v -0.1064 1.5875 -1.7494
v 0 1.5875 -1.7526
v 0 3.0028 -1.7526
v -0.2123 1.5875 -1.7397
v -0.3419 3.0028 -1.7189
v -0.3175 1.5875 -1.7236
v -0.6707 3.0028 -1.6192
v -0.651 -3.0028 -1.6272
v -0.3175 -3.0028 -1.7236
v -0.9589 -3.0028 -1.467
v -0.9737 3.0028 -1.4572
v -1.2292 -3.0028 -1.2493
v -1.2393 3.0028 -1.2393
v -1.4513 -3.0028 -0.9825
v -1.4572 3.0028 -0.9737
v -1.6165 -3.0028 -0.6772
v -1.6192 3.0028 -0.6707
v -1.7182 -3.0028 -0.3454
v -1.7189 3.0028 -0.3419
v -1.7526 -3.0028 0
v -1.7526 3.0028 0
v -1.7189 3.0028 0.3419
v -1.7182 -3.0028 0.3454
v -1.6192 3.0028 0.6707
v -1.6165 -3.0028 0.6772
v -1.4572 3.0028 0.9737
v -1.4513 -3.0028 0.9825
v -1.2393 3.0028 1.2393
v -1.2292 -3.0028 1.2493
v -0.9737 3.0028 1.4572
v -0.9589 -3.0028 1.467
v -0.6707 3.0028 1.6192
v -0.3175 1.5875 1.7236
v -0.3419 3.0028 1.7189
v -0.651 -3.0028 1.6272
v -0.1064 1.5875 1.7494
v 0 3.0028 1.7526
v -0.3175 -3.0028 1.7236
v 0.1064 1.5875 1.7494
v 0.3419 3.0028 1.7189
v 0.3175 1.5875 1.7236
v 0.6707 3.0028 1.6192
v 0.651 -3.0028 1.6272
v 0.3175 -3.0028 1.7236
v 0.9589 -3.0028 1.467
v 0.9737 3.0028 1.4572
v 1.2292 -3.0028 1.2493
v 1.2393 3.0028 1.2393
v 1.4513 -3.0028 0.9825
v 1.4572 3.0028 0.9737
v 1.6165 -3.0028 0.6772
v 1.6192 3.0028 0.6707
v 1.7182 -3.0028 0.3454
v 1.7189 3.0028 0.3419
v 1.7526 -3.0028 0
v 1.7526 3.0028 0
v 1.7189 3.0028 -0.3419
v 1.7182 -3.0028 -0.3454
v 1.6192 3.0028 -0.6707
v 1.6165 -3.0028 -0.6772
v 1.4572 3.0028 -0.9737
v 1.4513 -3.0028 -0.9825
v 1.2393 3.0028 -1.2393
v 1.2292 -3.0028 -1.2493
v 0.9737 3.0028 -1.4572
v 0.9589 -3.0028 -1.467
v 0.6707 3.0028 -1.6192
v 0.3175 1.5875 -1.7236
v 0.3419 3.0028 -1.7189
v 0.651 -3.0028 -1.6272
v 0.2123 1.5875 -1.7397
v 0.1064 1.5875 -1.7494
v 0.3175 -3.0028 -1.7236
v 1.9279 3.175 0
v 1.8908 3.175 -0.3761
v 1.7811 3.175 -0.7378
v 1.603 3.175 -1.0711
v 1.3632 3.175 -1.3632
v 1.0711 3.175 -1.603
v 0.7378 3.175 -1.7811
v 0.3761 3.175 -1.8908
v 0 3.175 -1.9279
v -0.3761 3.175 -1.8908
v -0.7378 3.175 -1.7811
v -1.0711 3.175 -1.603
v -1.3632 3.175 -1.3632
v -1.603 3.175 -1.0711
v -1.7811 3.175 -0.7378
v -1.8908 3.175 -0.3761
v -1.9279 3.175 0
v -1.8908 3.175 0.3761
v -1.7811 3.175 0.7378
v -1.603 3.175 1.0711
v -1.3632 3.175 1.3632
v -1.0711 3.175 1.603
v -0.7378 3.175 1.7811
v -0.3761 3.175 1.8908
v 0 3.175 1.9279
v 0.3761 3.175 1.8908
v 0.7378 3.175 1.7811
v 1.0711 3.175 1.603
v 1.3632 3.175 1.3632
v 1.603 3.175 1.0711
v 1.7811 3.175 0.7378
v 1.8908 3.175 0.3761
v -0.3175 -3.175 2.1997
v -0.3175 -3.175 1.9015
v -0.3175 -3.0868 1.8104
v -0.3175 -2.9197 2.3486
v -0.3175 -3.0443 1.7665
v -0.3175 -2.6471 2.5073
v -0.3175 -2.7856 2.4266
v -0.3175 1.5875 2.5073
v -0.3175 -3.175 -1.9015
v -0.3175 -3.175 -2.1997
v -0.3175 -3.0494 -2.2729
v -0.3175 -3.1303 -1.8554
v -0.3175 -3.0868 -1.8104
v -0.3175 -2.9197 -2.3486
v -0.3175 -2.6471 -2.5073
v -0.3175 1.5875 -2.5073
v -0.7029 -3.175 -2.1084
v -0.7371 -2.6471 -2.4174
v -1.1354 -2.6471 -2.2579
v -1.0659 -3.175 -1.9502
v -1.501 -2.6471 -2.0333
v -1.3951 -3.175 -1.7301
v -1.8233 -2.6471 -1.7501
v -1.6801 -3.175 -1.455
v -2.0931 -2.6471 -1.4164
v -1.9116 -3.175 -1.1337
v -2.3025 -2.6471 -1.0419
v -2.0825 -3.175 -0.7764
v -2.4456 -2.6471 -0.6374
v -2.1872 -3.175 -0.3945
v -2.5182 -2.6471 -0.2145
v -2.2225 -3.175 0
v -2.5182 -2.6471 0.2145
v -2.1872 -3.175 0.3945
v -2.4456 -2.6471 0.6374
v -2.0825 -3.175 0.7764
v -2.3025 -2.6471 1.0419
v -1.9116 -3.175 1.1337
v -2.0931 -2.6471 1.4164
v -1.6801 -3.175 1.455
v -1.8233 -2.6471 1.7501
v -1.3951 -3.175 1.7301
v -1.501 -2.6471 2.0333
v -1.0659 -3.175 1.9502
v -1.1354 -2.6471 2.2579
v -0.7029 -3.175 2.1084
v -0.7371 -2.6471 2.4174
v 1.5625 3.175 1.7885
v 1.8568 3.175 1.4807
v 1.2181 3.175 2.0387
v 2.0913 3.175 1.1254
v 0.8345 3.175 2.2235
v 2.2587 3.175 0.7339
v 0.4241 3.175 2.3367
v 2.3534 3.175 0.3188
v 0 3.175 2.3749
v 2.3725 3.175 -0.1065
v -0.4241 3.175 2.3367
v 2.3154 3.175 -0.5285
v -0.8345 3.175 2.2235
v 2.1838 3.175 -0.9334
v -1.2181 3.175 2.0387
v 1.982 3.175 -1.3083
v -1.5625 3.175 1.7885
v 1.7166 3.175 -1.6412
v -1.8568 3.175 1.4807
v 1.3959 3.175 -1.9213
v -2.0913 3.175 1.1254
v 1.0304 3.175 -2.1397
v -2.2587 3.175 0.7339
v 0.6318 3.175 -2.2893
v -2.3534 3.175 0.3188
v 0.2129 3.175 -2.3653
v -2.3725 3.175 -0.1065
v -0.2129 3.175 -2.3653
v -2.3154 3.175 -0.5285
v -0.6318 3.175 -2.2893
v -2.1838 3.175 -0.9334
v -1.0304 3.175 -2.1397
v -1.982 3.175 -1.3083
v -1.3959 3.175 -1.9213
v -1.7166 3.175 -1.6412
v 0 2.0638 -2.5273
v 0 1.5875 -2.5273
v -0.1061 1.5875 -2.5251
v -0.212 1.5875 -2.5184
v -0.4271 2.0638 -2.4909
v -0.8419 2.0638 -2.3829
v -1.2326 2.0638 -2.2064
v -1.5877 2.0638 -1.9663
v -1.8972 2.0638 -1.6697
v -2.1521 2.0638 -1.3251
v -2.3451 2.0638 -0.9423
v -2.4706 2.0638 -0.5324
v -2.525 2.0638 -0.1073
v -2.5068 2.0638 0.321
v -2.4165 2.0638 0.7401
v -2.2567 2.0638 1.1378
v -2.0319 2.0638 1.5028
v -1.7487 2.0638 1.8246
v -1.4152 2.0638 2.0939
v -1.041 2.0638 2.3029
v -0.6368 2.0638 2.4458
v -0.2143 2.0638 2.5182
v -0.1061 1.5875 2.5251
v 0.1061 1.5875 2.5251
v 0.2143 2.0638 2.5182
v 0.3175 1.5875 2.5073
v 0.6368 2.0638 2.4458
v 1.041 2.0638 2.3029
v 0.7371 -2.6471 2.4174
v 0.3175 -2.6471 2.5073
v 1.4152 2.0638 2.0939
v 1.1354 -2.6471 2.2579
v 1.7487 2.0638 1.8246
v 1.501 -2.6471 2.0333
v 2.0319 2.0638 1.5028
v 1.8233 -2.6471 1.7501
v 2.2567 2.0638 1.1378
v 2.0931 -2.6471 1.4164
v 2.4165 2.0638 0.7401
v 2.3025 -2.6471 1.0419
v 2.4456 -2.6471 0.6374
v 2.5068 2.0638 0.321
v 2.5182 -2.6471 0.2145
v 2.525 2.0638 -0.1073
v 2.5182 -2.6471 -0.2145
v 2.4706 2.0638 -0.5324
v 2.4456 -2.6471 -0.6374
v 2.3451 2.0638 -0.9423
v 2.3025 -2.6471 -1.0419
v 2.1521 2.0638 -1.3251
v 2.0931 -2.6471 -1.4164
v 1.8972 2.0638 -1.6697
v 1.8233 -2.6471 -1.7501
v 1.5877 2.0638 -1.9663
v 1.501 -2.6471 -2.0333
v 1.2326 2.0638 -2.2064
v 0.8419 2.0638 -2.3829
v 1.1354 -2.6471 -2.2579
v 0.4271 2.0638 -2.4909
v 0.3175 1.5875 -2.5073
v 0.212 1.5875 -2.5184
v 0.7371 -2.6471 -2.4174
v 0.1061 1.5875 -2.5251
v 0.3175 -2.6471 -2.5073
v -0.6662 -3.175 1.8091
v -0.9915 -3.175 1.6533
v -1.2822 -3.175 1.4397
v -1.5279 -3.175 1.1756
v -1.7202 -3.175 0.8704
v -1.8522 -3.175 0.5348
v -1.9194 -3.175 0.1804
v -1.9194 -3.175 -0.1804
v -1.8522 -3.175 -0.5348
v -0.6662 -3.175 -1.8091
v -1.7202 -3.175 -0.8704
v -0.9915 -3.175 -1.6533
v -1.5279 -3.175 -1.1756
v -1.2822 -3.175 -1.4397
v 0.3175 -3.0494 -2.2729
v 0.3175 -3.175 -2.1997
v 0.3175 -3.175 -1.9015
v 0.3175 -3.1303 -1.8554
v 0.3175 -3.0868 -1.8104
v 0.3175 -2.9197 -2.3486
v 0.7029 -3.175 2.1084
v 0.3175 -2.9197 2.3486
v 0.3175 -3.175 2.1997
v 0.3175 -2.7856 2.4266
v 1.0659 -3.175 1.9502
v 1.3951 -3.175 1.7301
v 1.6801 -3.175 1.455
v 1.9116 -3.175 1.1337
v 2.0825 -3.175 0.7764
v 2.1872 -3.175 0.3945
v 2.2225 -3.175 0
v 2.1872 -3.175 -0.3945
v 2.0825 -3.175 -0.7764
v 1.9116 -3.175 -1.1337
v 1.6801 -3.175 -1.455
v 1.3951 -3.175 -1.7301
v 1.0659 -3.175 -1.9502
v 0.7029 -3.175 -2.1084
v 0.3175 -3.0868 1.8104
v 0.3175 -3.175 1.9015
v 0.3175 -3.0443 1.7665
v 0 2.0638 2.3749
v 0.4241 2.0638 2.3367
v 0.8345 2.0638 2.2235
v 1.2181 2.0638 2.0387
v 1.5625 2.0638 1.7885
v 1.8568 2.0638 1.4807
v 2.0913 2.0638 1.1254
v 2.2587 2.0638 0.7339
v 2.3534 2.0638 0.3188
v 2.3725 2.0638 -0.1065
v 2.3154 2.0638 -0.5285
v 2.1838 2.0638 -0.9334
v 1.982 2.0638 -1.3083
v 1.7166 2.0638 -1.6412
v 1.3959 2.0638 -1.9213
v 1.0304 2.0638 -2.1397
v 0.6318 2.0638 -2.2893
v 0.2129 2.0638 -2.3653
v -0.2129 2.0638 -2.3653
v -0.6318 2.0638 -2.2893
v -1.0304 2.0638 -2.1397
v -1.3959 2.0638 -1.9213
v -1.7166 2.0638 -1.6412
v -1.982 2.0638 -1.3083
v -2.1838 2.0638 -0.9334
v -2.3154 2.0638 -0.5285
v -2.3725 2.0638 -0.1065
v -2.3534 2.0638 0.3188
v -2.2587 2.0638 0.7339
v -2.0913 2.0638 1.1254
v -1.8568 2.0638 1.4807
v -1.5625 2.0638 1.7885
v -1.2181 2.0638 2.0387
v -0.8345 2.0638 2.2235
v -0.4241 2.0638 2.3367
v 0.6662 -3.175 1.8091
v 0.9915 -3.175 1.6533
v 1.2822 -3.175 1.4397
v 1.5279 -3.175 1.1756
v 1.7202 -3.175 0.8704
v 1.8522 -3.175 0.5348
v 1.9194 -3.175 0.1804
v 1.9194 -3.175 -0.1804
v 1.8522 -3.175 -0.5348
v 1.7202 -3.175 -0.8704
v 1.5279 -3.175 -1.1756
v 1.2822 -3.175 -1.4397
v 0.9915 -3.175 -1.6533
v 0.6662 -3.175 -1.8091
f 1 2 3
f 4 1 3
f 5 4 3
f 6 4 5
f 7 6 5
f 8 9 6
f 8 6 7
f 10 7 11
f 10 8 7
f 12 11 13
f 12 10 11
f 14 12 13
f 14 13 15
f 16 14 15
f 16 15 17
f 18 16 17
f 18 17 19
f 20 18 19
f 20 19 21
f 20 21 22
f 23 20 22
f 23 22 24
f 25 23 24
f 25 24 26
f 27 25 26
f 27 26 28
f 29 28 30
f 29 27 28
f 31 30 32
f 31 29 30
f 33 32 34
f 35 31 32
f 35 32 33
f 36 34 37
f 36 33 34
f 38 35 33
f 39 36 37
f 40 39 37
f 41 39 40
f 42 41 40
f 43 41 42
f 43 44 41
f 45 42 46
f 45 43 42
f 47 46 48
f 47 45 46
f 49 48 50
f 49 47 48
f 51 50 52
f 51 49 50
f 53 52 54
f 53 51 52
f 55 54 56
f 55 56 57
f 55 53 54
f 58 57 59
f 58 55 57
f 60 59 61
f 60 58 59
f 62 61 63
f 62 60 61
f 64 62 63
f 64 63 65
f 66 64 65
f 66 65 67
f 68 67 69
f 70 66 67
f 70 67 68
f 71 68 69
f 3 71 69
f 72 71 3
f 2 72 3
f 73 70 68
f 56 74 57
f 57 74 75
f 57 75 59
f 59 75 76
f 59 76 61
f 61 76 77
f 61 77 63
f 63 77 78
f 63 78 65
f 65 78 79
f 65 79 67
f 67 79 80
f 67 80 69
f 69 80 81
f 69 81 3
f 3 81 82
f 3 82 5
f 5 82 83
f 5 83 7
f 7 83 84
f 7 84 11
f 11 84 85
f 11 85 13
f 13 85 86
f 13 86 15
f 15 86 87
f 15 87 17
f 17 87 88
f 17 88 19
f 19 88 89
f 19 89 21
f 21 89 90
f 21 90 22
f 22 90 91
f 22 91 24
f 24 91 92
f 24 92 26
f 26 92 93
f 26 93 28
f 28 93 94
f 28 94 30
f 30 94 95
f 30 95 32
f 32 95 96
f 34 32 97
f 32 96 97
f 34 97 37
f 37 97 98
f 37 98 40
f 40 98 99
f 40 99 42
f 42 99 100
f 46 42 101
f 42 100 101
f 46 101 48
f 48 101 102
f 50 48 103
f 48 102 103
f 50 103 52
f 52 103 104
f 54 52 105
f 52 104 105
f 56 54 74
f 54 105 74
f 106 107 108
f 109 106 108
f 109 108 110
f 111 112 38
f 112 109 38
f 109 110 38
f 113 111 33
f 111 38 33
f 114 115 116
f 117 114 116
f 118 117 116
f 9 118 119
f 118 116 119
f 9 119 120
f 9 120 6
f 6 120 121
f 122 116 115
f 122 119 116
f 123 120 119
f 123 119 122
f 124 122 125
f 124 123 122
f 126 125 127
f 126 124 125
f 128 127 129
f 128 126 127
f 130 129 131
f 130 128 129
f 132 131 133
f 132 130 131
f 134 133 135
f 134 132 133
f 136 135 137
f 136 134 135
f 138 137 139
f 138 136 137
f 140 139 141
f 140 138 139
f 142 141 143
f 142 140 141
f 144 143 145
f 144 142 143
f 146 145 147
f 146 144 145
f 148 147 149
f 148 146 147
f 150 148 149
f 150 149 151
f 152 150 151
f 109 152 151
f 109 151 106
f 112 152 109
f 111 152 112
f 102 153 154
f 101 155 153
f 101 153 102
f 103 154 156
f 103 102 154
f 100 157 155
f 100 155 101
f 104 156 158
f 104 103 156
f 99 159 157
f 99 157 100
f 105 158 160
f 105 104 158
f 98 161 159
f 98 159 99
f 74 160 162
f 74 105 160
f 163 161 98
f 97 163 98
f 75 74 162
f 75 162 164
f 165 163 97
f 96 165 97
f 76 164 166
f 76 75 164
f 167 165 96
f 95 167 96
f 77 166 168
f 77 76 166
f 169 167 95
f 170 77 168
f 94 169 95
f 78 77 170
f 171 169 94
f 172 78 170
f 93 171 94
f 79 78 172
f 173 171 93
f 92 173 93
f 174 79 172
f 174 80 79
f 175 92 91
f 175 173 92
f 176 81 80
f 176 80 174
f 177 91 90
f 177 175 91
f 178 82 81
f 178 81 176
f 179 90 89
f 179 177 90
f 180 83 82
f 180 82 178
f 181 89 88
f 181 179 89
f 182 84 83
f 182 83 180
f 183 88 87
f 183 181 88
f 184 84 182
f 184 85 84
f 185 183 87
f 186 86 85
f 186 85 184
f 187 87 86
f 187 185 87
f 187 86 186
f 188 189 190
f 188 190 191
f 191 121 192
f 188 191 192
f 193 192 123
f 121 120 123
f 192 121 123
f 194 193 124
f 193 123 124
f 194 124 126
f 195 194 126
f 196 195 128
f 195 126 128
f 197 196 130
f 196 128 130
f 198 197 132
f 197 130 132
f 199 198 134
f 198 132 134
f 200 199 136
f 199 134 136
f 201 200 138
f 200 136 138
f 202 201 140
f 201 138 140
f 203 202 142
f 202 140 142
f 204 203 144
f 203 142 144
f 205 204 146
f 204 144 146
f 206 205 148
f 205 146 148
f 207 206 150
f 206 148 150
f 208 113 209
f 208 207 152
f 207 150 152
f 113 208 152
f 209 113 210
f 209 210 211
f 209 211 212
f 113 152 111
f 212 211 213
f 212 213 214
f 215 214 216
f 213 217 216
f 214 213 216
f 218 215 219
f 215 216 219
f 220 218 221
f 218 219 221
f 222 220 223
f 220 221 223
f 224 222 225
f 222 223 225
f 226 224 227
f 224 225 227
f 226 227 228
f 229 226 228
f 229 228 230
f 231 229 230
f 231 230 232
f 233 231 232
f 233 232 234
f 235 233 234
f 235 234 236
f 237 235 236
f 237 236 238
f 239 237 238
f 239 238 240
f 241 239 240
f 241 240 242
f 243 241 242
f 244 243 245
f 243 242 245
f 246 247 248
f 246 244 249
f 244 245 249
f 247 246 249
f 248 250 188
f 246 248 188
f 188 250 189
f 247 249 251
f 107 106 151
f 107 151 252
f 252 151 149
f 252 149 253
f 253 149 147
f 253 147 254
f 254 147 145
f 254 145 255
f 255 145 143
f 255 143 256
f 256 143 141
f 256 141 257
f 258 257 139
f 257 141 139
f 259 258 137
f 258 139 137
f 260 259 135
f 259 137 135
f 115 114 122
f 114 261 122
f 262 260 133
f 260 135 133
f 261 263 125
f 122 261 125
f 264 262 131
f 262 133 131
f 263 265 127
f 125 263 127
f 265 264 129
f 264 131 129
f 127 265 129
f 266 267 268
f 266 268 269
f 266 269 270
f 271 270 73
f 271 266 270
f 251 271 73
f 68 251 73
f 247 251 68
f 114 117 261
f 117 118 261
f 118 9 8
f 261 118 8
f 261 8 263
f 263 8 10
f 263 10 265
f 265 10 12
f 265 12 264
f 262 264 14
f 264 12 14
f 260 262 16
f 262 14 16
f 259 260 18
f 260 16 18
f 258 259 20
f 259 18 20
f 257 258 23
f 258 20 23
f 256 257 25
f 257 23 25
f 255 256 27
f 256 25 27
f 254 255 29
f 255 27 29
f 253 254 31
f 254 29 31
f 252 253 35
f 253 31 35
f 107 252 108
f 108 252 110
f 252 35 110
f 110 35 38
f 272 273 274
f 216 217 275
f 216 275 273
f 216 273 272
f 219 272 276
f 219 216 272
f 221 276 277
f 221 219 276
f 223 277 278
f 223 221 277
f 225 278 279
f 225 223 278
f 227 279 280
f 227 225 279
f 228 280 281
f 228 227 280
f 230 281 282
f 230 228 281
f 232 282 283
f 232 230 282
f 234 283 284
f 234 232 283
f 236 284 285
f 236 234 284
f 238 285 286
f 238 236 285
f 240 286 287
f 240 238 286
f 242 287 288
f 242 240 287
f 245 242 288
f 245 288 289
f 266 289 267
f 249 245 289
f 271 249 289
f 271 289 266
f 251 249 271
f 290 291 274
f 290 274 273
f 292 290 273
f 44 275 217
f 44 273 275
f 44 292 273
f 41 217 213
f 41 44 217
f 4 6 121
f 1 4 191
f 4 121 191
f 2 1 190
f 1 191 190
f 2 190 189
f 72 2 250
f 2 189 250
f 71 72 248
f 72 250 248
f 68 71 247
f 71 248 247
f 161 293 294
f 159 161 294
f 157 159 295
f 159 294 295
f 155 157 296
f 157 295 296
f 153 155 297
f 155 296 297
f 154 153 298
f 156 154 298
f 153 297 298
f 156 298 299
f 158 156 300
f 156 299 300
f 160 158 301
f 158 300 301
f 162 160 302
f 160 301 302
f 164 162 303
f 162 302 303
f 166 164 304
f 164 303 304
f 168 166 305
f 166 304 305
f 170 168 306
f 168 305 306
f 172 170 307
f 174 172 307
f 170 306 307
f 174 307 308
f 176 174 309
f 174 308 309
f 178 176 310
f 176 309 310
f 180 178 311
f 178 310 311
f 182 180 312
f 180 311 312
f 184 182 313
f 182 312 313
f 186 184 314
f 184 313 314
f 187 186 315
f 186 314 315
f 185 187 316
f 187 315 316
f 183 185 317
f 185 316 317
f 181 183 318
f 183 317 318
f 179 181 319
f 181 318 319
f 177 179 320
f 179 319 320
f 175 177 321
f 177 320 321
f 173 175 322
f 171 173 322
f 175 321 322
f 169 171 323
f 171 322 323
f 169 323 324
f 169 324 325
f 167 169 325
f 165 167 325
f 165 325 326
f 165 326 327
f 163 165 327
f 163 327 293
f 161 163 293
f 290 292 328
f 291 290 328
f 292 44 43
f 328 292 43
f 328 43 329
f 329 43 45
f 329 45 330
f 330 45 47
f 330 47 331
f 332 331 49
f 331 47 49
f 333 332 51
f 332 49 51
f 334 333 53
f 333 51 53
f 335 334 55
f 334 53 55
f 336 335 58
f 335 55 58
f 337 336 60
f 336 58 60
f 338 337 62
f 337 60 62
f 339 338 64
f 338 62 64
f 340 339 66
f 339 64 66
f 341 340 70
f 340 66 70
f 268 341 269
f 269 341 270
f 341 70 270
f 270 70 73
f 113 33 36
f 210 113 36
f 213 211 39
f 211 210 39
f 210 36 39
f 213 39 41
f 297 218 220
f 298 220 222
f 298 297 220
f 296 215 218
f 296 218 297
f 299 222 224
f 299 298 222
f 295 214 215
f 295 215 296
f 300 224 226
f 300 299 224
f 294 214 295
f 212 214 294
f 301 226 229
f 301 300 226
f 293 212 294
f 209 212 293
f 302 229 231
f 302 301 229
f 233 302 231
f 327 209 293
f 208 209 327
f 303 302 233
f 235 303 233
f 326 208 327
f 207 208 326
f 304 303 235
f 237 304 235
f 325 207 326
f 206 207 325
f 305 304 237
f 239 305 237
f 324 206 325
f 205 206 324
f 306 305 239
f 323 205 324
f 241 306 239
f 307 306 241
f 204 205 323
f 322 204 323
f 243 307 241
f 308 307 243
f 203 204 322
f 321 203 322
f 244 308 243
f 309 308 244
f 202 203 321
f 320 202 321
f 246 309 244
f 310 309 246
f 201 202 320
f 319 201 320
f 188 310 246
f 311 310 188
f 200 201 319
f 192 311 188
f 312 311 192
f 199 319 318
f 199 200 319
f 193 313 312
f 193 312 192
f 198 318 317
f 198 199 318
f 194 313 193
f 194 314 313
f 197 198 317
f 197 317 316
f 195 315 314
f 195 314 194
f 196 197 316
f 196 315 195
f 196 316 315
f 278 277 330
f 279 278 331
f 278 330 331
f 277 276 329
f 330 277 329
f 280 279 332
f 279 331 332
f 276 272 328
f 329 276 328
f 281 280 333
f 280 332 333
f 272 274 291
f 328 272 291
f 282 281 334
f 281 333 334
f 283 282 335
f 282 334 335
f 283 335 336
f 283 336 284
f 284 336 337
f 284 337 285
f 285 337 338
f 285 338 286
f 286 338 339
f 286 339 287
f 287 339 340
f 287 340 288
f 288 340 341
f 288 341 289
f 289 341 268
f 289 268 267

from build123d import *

# Parameters (mm, degrees)
BOSS_EXTRUDE1_DEPTH      = 3.175
BOSS_EXTRUDE1_DEPTH_BACK = 3.175
SKETCH11_R               = 2.5273
SKETCH11_R_2             = 1.7526
CUT_EXTRUDE1_START       = 2.06375
SKETCH12_R               = 2.5273
SKETCH12_R_2             = 2.3749
CUT_EXTRUDE1_DEPTH       = 1.11125
CHAMFER2_SIZE            = 0.3048
CHAMFER2_SIZE2           = 0.527929086
EXTRUDE4_DEPTH           = 5.780702415
EXTRUDE4_DEPTH_BACK      = 5.780702415
SKETCH8_W                = 0.635
SKETCH8_H                = 4.7625


# Read off the part's stored shape, not the designer's step: Cut-Extrude3, Cut-Extrude10
with BuildPart() as part:
    # Sketch11 → Boss-Extrude1 (new, two sides: drawn at the far end of the back side and taken through both)
    with BuildSketch(Plane(origin=(0, 0, 0), x_dir=(1, 0, 0), z_dir=(0, 1, 0)).offset(-BOSS_EXTRUDE1_DEPTH_BACK)):
        with Locations(Location((0, 0, 0), (0, 0, 90))):
            Circle(SKETCH11_R)
        with Locations(Location((0, 0, 0), (0, 0, 90))):
            Circle(SKETCH11_R_2, mode=Mode.SUBTRACT)
    extrude(amount=BOSS_EXTRUDE1_DEPTH + BOSS_EXTRUDE1_DEPTH_BACK)

    # Sketch12 → Cut-Extrude1 (cut)
    with BuildSketch(Plane(origin=(0, 0, 0), x_dir=(1, 0, 0), z_dir=(0, 1, 0)).offset(CUT_EXTRUDE1_START)):
        with Locations(Location((0, 0, 0), (0, 0, 90))):
            Circle(SKETCH12_R)
        with Locations(Location((0, 0, 0), (0, 0, 270))):
            Circle(SKETCH12_R_2, mode=Mode.SUBTRACT)
    extrude(amount=CUT_EXTRUDE1_DEPTH, mode=Mode.SUBTRACT)

    # Cut-Extrude3 outline → Cut-Extrude3 (revolve, cut)
    with BuildSketch(Plane.XY):
        Polygon((1.7526, 3.175), (1.7526, 3.002772478), (1.92786, 3.175), align=None)
    revolve(axis=Axis((0, 0, 0), (0, 1, 0)), mode=Mode.SUBTRACT)

    # Cut-Extrude10 outline → Cut-Extrude10 (revolve, cut)
    with BuildSketch(Plane.XY):
        Polygon((1.92786, -3.175), (1.7526, -3.002772478), (1.7526, -3.175), align=None)
    revolve(axis=Axis((0, 0, 0), (0, 1, 0)), mode=Mode.SUBTRACT)

    # Chamfer2
    chamfer2_edges = [part.edges().sort_by_distance(p)[0] for p in [
        (0, -3.175, 2.5273),
    ]]
    chamfer2_side = [part.faces().sort_by_distance(p)[0] for p in [
        (0, -3.175, 2.455817161),
    ]]
    chamfer(chamfer2_edges, length=CHAMFER2_SIZE, length2=CHAMFER2_SIZE2, reference=chamfer2_side[0])

    # Sketch8 → Extrude4 (cut, two sides: drawn at the far end of the back side and taken through both)
    with BuildSketch(Plane.XY.offset(-EXTRUDE4_DEPTH_BACK)):
        with Locations((0, -0.79375)):
            Rectangle(SKETCH8_W, SKETCH8_H)
    extrude(amount=EXTRUDE4_DEPTH + EXTRUDE4_DEPTH_BACK, mode=Mode.SUBTRACT)


solid = part.part
